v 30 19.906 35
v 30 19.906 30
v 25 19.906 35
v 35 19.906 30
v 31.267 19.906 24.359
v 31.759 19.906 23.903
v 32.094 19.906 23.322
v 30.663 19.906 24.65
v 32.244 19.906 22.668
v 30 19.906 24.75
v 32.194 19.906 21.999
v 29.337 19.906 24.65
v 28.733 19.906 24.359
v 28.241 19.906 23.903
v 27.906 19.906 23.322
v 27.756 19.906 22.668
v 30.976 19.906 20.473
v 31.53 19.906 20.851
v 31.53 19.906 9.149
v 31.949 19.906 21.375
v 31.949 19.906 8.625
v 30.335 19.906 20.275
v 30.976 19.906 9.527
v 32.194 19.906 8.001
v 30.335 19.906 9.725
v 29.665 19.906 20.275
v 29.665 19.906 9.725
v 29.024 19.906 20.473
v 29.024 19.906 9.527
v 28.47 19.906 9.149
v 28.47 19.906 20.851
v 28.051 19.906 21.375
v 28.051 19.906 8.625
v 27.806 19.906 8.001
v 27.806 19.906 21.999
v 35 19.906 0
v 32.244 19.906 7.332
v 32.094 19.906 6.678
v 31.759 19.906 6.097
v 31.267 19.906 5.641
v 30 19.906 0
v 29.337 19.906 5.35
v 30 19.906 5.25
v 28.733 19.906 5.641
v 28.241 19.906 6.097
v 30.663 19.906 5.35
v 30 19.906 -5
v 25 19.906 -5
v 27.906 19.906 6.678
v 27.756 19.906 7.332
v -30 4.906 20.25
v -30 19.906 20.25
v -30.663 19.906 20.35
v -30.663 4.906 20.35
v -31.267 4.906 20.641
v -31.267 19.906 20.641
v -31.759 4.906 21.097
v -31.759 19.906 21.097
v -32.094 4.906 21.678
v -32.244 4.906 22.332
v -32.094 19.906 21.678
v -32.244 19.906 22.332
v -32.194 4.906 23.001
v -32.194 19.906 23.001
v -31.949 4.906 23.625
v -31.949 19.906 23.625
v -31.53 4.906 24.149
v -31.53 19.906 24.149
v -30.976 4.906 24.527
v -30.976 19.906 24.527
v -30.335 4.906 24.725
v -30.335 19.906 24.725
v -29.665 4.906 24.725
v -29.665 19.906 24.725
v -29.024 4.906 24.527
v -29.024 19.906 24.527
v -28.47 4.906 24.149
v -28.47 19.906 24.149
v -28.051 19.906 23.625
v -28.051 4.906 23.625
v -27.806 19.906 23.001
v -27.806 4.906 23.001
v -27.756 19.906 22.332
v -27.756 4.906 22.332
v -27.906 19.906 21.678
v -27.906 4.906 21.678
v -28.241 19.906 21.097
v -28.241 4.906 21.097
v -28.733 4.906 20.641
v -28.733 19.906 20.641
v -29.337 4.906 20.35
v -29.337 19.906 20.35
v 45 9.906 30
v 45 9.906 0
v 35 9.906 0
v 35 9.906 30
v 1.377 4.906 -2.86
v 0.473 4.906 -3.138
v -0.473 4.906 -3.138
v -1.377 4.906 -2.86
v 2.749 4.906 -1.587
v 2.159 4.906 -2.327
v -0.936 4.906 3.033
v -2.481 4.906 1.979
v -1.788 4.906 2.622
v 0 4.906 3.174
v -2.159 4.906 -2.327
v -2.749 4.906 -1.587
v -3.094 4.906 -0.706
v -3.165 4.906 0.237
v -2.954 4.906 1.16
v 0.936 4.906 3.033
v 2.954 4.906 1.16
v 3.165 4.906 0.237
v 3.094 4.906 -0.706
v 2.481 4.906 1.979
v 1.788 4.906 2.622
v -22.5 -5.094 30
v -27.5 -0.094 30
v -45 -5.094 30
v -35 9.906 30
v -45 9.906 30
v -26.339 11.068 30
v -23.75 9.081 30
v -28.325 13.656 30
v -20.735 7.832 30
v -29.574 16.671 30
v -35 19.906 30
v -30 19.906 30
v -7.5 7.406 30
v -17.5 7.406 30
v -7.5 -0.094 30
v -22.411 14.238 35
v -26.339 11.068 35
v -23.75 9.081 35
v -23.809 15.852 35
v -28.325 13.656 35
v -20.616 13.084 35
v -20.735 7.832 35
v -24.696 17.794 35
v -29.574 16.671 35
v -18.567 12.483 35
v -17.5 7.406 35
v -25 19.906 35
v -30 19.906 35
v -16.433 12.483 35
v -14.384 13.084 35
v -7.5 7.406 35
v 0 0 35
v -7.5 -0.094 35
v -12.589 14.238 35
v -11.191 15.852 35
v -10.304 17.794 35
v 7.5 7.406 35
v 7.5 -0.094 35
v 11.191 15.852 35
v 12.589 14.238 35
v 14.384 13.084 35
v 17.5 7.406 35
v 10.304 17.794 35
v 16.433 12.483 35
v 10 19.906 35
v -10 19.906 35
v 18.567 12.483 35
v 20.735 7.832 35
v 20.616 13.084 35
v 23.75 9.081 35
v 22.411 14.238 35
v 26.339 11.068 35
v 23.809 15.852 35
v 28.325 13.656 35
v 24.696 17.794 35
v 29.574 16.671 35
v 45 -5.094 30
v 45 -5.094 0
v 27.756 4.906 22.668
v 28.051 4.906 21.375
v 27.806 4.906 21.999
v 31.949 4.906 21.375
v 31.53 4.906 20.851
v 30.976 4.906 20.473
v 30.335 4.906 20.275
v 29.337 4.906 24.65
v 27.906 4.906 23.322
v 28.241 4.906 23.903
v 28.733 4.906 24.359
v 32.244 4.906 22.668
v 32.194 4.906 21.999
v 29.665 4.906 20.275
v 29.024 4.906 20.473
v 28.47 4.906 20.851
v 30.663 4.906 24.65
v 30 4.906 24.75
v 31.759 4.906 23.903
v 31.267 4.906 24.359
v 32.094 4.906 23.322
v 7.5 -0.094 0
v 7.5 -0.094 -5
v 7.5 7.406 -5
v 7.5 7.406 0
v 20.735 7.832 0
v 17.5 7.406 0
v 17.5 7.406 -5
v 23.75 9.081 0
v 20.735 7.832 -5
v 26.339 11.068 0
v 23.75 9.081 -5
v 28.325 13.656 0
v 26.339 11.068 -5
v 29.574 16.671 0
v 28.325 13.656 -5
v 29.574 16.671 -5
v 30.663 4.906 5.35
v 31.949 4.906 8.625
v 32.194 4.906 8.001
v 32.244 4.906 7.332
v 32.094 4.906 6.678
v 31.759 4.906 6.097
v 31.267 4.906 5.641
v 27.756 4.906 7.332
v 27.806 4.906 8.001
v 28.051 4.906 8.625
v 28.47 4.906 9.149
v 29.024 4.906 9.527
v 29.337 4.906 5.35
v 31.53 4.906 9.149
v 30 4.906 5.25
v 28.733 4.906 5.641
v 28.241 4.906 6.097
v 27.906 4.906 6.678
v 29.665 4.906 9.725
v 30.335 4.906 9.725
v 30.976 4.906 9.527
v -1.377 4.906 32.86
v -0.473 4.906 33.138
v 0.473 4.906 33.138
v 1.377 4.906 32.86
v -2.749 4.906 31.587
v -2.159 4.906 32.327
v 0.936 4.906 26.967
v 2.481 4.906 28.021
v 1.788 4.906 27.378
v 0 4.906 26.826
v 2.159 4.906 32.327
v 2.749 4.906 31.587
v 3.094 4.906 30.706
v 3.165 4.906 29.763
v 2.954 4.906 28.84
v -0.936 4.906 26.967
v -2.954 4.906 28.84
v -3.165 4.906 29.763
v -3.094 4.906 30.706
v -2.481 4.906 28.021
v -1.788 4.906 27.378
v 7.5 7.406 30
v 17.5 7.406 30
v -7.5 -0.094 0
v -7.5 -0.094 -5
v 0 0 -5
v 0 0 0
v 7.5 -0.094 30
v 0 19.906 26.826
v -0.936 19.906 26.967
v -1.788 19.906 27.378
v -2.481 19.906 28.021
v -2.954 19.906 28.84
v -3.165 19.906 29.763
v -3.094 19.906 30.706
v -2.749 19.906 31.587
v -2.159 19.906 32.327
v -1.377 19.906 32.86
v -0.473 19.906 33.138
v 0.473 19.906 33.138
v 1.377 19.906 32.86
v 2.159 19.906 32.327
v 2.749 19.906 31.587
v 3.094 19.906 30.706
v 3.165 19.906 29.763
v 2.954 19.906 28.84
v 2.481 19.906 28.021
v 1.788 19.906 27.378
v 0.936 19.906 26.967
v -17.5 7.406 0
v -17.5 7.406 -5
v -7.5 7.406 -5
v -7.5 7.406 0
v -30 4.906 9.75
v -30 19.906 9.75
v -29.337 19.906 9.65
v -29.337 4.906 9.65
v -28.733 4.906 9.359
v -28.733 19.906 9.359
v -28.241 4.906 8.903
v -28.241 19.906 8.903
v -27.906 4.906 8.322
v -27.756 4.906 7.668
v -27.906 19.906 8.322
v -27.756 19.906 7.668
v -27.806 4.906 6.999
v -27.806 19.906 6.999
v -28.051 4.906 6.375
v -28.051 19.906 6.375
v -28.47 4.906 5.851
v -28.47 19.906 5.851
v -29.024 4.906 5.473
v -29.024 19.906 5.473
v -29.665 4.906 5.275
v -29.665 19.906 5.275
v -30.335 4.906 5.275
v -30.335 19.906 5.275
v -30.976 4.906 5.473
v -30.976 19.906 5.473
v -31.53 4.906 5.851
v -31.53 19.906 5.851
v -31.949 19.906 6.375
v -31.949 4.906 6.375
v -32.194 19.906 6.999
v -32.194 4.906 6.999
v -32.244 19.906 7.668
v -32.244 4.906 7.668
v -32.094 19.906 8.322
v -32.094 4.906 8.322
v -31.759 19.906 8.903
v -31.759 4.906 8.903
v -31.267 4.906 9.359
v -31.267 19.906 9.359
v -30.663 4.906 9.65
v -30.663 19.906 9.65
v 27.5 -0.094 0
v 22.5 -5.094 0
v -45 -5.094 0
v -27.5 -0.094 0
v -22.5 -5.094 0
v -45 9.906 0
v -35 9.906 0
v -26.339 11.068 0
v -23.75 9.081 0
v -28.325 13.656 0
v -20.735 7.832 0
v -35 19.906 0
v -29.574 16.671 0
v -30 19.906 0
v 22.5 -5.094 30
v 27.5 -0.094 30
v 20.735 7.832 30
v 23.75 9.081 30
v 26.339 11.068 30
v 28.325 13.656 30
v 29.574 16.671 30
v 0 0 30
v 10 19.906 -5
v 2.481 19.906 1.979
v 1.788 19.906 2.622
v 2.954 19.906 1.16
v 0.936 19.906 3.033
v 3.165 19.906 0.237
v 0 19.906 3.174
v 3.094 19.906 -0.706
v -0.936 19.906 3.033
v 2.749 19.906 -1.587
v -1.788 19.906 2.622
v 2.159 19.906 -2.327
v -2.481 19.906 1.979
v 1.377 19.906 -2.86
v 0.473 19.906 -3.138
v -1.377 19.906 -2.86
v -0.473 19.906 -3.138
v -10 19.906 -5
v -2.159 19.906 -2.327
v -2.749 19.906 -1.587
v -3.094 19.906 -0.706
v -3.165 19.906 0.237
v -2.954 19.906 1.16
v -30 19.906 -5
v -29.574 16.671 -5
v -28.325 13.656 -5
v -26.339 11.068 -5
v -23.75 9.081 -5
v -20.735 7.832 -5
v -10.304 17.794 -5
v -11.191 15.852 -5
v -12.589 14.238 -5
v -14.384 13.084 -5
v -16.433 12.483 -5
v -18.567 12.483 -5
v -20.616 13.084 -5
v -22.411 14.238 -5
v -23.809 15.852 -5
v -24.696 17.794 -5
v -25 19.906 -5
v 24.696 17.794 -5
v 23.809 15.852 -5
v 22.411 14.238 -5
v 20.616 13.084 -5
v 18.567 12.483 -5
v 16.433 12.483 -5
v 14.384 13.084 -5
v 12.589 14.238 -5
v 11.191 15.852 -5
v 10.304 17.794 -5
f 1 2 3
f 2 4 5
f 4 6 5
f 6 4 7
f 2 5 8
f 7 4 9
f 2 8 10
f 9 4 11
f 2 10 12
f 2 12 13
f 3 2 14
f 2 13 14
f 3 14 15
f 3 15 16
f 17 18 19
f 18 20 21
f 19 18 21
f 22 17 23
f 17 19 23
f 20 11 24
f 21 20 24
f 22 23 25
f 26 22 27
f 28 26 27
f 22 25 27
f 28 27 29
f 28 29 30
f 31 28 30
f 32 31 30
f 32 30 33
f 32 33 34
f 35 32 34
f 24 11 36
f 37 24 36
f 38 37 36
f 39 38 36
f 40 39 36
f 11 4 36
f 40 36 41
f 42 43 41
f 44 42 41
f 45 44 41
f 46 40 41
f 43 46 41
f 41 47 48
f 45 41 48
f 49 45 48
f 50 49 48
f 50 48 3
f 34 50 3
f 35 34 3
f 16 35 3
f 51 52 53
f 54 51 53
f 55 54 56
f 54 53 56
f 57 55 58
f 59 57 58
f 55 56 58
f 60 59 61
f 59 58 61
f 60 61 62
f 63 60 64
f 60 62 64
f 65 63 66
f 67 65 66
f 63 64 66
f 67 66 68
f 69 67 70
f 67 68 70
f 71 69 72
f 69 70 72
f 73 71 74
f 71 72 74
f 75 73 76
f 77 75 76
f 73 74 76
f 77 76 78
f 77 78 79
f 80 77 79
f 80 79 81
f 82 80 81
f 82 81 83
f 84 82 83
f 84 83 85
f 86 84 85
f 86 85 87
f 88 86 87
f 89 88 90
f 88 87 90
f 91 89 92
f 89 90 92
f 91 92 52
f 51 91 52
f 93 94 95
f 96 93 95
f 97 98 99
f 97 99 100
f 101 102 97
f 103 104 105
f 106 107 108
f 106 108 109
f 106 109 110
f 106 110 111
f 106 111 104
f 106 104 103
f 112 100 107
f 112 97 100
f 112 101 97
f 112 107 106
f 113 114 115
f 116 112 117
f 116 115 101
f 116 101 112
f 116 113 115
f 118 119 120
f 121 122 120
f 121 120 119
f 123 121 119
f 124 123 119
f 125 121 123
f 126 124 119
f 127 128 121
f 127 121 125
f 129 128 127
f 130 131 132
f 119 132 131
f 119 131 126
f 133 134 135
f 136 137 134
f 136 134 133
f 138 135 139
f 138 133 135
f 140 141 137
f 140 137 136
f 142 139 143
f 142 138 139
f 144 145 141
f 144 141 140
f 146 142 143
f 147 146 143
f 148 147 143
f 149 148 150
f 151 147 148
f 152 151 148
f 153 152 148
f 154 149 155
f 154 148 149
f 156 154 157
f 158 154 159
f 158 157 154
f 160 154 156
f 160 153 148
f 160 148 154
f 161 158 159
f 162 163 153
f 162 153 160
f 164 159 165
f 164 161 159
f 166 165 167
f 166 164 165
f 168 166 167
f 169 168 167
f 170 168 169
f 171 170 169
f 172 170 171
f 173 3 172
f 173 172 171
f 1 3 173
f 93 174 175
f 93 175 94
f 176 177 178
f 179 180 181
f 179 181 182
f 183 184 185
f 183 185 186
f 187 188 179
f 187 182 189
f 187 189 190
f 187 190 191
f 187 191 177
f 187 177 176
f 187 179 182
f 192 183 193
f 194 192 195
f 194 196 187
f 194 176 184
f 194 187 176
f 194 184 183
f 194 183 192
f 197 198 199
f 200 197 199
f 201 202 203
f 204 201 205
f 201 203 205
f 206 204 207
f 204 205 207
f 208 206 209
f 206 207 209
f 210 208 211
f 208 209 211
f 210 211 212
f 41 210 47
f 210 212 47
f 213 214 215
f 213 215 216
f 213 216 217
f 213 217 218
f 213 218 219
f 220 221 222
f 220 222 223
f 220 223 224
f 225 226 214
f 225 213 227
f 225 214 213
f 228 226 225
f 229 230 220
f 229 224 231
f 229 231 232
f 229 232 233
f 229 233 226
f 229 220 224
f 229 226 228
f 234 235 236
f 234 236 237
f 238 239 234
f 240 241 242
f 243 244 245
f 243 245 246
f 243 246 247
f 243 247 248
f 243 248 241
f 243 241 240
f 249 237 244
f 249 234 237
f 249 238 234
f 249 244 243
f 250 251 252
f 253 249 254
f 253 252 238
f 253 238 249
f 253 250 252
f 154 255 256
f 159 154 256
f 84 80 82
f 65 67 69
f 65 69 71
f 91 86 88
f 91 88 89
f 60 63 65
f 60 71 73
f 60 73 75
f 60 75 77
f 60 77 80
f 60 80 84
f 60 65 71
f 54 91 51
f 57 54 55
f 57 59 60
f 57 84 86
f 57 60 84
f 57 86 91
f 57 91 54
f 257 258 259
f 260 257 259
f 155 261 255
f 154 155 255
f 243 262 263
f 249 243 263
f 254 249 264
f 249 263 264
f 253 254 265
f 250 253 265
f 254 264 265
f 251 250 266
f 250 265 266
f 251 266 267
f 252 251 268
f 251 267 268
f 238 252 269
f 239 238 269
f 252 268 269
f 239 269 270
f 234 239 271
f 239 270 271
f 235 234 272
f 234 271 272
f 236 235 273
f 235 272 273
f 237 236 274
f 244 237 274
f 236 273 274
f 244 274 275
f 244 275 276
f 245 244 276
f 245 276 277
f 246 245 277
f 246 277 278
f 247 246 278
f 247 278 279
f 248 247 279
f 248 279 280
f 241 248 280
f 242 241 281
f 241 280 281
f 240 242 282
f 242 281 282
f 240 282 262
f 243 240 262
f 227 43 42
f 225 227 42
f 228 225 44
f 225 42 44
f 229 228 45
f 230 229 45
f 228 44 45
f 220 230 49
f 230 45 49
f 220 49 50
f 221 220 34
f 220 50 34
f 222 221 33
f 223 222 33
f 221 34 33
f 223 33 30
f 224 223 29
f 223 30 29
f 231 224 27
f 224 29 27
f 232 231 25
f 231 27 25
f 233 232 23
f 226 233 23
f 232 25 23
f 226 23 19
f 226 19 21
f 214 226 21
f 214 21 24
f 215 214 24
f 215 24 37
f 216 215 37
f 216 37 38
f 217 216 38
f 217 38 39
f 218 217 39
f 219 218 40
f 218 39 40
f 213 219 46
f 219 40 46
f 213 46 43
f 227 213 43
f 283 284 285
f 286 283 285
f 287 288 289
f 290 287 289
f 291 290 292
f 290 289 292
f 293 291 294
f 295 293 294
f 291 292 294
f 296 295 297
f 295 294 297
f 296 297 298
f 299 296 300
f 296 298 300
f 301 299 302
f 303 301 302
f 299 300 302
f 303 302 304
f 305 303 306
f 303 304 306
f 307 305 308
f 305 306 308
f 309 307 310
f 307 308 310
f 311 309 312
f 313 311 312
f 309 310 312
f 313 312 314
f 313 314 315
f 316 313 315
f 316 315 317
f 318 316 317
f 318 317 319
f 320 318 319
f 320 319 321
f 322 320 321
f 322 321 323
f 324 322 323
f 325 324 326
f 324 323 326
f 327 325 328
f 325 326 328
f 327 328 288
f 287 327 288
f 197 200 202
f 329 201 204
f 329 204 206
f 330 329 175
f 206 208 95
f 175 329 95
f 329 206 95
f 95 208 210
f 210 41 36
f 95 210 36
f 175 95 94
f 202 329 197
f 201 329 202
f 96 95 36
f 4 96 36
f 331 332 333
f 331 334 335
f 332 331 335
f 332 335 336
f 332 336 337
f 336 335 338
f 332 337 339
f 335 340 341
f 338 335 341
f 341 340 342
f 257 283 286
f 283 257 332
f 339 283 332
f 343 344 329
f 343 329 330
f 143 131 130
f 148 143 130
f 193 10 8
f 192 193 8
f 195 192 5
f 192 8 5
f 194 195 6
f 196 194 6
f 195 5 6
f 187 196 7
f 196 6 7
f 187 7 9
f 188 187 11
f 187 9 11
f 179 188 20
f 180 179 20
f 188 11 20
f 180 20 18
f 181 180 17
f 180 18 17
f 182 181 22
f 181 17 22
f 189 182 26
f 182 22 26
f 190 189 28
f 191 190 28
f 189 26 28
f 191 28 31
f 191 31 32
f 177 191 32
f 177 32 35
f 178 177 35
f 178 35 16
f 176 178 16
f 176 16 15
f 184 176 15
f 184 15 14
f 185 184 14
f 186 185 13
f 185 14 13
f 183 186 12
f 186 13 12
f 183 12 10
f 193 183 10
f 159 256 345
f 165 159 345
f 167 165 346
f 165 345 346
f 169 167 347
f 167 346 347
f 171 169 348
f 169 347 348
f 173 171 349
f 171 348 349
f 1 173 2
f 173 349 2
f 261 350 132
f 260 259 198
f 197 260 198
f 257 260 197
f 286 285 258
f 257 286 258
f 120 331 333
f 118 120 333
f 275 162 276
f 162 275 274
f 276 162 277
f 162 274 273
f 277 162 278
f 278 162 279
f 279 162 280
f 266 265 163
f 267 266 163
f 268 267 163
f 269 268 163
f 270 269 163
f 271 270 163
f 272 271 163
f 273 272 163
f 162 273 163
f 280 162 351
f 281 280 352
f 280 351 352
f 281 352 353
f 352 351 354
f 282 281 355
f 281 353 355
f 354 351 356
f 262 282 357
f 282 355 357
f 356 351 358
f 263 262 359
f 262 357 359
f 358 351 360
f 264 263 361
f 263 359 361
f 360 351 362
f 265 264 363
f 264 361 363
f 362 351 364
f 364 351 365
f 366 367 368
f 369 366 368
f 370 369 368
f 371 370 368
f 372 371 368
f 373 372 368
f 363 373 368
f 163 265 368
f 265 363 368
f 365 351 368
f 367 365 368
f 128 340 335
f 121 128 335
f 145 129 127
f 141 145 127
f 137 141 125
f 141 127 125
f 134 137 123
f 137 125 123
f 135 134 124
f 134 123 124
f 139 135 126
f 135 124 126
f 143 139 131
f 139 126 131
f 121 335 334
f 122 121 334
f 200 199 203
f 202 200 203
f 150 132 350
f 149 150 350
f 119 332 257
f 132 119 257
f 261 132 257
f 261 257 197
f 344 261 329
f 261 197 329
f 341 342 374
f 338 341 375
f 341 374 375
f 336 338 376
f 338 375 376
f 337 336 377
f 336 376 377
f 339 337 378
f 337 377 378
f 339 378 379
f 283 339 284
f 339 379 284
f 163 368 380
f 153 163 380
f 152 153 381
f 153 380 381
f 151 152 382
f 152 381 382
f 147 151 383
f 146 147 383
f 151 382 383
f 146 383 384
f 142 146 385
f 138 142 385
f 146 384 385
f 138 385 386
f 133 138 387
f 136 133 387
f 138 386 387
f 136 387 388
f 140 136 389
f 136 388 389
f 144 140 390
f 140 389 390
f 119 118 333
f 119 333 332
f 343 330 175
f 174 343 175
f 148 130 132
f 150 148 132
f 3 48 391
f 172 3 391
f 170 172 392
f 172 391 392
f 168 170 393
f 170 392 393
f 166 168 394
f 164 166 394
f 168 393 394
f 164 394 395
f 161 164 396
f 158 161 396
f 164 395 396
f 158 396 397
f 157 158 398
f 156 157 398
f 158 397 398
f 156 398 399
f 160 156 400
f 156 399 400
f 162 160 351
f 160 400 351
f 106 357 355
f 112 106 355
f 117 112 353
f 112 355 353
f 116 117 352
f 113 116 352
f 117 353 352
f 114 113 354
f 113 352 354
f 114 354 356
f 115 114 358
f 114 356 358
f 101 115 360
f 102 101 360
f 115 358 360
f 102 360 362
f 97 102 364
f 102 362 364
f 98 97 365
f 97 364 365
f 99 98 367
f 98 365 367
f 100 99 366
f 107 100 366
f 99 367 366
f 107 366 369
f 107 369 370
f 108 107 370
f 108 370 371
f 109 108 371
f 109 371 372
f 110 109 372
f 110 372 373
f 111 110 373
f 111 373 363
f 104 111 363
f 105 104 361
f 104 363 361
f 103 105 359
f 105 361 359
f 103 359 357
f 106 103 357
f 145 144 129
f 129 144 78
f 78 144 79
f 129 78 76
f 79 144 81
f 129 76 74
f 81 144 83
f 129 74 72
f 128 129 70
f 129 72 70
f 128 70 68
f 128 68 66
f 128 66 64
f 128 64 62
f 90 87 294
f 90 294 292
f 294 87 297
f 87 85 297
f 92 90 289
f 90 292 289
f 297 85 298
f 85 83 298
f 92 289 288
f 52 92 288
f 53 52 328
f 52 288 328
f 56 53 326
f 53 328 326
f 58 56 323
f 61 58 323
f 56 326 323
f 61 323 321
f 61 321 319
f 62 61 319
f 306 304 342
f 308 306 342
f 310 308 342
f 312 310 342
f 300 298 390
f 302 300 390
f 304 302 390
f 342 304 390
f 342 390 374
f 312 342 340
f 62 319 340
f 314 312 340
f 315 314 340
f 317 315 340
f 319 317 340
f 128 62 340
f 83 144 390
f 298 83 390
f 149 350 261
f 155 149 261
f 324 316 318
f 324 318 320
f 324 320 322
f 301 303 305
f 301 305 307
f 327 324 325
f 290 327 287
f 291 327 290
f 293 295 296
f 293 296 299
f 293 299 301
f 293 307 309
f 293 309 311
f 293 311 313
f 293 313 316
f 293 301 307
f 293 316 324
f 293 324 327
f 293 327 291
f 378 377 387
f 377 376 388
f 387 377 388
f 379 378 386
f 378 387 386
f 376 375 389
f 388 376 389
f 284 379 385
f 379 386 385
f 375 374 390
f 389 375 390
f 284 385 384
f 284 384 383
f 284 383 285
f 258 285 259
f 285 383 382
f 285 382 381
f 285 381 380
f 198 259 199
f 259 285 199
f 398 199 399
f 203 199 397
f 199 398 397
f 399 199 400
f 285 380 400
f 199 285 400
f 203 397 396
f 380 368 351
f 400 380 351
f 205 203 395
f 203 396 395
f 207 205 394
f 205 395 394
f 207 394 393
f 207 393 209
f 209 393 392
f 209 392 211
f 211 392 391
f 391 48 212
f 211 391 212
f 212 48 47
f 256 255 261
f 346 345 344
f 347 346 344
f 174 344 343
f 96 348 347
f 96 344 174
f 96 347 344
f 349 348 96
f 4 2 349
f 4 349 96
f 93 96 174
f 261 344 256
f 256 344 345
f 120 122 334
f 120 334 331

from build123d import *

# Parameters (mm, degrees)
BOSS_EXTRUDE1_DEPTH      = 30
BOSS_EXTRUDE2_DEPTH      = 5
BOSS_EXTRUDE2_DEPTH_BACK = 35
SKETCH3_R                = 3.173895943
SKETCH3_R_2              = 2.25
CUT_EXTRUDE1_DEPTH       = 15


with BuildPart() as part:
    # Sketch1 → Boss-Extrude1 (new body)
    with BuildSketch(Plane.XY):
        with BuildLine():
            Line((-45, 9.906496063), (-45, -5.093503937))
            Line((-45, -5.093503937), (-22.5, -5.093503937))
            Line((-22.5, -5.093503937), (-27.5, -0.093503937))
            Line((-27.5, -0.093503937), (27.5, -0.093503937))
            Line((27.5, -0.093503937), (22.5, -5.093503937))
            Line((22.5, -5.093503937), (45, -5.093503937))
            Line((45, -5.093503937), (45, 9.906496063))
            Line((45, 9.906496063), (35, 9.906496063))
            Line((35, 9.906496063), (35, 19.906496063))
            Line((35, 19.906496063), (25, 19.906496063))
            ThreePointArc((25, 19.906496063), (17.5, 12.406496063), (10, 19.906496063))
            Line((10, 19.906496063), (-10, 19.906496063))
            ThreePointArc((-10, 19.906496063), (-17.5, 12.406496063), (-25, 19.906496063))
            Line((-25, 19.906496063), (-35, 19.906496063))
            Line((-35, 19.906496063), (-35, 9.906496063))
            Line((-35, 9.906496063), (-45, 9.906496063))
        make_face()
    extrude(amount=BOSS_EXTRUDE1_DEPTH)

    # Sketch2 → Boss-Extrude2 (add, two sides: drawn at the far end of the back side and taken through both)
    with BuildSketch(Plane.XY.offset(30).offset(-BOSS_EXTRUDE2_DEPTH_BACK)):
        with BuildLine():
            Line((-7.5, -0.093503937), (0, 0))
            Line((0, 0), (7.5, -0.093503937))
            Line((7.5, -0.093503937), (7.5, 7.406496063))
            Line((7.5, 7.406496063), (17.5, 7.406496063))
            ThreePointArc((17.5, 7.406496063), (26.338834765, 11.067661298), (30, 19.906496063))
            Line((30, 19.906496063), (25, 19.906496063))
            ThreePointArc((25, 19.906496063), (17.5, 12.406496063), (10, 19.906496063))
            Line((10, 19.906496063), (-10, 19.906496063))
            ThreePointArc((-10, 19.906496063), (-17.5, 12.406496063), (-25, 19.906496063))
            Line((-25, 19.906496063), (-30, 19.906496063))
            ThreePointArc((-30, 19.906496063), (-26.338834765, 11.067661298), (-17.5, 7.406496063))
            Line((-17.5, 7.406496063), (-7.5, 7.406496063))
            Line((-7.5, 7.406496063), (-7.5, -0.093503937))
        make_face()
    extrude(amount=BOSS_EXTRUDE2_DEPTH + BOSS_EXTRUDE2_DEPTH_BACK)

    # Sketch3 → Cut-Extrude1 (cut)
    with BuildSketch(Plane(origin=(0, 19.906496063, 0), x_dir=(1, 0, 0), z_dir=(0, 1, 0))):
        with Locations(Location((0, 0, 0), (0, 0, 270))):
            Circle(SKETCH3_R)
        with Locations(Location((-30, -7.5, 0), (0, 0, 270))):
            Circle(SKETCH3_R_2)
        with Locations(Location((30, -7.5, 0), (0, 0, 90))):
            Circle(SKETCH3_R_2)
        with Locations(Location((30, -22.5, 0), (0, 0, 270))):
            Circle(SKETCH3_R_2)
        with Locations(Location((0, -30, 0), (0, 0, 90))):
            Circle(SKETCH3_R)
        with Locations(Location((-30, -22.5, 0), (0, 0, 90))):
            Circle(SKETCH3_R_2)
    extrude(amount=-CUT_EXTRUDE1_DEPTH, mode=Mode.SUBTRACT)


solid = part.part
